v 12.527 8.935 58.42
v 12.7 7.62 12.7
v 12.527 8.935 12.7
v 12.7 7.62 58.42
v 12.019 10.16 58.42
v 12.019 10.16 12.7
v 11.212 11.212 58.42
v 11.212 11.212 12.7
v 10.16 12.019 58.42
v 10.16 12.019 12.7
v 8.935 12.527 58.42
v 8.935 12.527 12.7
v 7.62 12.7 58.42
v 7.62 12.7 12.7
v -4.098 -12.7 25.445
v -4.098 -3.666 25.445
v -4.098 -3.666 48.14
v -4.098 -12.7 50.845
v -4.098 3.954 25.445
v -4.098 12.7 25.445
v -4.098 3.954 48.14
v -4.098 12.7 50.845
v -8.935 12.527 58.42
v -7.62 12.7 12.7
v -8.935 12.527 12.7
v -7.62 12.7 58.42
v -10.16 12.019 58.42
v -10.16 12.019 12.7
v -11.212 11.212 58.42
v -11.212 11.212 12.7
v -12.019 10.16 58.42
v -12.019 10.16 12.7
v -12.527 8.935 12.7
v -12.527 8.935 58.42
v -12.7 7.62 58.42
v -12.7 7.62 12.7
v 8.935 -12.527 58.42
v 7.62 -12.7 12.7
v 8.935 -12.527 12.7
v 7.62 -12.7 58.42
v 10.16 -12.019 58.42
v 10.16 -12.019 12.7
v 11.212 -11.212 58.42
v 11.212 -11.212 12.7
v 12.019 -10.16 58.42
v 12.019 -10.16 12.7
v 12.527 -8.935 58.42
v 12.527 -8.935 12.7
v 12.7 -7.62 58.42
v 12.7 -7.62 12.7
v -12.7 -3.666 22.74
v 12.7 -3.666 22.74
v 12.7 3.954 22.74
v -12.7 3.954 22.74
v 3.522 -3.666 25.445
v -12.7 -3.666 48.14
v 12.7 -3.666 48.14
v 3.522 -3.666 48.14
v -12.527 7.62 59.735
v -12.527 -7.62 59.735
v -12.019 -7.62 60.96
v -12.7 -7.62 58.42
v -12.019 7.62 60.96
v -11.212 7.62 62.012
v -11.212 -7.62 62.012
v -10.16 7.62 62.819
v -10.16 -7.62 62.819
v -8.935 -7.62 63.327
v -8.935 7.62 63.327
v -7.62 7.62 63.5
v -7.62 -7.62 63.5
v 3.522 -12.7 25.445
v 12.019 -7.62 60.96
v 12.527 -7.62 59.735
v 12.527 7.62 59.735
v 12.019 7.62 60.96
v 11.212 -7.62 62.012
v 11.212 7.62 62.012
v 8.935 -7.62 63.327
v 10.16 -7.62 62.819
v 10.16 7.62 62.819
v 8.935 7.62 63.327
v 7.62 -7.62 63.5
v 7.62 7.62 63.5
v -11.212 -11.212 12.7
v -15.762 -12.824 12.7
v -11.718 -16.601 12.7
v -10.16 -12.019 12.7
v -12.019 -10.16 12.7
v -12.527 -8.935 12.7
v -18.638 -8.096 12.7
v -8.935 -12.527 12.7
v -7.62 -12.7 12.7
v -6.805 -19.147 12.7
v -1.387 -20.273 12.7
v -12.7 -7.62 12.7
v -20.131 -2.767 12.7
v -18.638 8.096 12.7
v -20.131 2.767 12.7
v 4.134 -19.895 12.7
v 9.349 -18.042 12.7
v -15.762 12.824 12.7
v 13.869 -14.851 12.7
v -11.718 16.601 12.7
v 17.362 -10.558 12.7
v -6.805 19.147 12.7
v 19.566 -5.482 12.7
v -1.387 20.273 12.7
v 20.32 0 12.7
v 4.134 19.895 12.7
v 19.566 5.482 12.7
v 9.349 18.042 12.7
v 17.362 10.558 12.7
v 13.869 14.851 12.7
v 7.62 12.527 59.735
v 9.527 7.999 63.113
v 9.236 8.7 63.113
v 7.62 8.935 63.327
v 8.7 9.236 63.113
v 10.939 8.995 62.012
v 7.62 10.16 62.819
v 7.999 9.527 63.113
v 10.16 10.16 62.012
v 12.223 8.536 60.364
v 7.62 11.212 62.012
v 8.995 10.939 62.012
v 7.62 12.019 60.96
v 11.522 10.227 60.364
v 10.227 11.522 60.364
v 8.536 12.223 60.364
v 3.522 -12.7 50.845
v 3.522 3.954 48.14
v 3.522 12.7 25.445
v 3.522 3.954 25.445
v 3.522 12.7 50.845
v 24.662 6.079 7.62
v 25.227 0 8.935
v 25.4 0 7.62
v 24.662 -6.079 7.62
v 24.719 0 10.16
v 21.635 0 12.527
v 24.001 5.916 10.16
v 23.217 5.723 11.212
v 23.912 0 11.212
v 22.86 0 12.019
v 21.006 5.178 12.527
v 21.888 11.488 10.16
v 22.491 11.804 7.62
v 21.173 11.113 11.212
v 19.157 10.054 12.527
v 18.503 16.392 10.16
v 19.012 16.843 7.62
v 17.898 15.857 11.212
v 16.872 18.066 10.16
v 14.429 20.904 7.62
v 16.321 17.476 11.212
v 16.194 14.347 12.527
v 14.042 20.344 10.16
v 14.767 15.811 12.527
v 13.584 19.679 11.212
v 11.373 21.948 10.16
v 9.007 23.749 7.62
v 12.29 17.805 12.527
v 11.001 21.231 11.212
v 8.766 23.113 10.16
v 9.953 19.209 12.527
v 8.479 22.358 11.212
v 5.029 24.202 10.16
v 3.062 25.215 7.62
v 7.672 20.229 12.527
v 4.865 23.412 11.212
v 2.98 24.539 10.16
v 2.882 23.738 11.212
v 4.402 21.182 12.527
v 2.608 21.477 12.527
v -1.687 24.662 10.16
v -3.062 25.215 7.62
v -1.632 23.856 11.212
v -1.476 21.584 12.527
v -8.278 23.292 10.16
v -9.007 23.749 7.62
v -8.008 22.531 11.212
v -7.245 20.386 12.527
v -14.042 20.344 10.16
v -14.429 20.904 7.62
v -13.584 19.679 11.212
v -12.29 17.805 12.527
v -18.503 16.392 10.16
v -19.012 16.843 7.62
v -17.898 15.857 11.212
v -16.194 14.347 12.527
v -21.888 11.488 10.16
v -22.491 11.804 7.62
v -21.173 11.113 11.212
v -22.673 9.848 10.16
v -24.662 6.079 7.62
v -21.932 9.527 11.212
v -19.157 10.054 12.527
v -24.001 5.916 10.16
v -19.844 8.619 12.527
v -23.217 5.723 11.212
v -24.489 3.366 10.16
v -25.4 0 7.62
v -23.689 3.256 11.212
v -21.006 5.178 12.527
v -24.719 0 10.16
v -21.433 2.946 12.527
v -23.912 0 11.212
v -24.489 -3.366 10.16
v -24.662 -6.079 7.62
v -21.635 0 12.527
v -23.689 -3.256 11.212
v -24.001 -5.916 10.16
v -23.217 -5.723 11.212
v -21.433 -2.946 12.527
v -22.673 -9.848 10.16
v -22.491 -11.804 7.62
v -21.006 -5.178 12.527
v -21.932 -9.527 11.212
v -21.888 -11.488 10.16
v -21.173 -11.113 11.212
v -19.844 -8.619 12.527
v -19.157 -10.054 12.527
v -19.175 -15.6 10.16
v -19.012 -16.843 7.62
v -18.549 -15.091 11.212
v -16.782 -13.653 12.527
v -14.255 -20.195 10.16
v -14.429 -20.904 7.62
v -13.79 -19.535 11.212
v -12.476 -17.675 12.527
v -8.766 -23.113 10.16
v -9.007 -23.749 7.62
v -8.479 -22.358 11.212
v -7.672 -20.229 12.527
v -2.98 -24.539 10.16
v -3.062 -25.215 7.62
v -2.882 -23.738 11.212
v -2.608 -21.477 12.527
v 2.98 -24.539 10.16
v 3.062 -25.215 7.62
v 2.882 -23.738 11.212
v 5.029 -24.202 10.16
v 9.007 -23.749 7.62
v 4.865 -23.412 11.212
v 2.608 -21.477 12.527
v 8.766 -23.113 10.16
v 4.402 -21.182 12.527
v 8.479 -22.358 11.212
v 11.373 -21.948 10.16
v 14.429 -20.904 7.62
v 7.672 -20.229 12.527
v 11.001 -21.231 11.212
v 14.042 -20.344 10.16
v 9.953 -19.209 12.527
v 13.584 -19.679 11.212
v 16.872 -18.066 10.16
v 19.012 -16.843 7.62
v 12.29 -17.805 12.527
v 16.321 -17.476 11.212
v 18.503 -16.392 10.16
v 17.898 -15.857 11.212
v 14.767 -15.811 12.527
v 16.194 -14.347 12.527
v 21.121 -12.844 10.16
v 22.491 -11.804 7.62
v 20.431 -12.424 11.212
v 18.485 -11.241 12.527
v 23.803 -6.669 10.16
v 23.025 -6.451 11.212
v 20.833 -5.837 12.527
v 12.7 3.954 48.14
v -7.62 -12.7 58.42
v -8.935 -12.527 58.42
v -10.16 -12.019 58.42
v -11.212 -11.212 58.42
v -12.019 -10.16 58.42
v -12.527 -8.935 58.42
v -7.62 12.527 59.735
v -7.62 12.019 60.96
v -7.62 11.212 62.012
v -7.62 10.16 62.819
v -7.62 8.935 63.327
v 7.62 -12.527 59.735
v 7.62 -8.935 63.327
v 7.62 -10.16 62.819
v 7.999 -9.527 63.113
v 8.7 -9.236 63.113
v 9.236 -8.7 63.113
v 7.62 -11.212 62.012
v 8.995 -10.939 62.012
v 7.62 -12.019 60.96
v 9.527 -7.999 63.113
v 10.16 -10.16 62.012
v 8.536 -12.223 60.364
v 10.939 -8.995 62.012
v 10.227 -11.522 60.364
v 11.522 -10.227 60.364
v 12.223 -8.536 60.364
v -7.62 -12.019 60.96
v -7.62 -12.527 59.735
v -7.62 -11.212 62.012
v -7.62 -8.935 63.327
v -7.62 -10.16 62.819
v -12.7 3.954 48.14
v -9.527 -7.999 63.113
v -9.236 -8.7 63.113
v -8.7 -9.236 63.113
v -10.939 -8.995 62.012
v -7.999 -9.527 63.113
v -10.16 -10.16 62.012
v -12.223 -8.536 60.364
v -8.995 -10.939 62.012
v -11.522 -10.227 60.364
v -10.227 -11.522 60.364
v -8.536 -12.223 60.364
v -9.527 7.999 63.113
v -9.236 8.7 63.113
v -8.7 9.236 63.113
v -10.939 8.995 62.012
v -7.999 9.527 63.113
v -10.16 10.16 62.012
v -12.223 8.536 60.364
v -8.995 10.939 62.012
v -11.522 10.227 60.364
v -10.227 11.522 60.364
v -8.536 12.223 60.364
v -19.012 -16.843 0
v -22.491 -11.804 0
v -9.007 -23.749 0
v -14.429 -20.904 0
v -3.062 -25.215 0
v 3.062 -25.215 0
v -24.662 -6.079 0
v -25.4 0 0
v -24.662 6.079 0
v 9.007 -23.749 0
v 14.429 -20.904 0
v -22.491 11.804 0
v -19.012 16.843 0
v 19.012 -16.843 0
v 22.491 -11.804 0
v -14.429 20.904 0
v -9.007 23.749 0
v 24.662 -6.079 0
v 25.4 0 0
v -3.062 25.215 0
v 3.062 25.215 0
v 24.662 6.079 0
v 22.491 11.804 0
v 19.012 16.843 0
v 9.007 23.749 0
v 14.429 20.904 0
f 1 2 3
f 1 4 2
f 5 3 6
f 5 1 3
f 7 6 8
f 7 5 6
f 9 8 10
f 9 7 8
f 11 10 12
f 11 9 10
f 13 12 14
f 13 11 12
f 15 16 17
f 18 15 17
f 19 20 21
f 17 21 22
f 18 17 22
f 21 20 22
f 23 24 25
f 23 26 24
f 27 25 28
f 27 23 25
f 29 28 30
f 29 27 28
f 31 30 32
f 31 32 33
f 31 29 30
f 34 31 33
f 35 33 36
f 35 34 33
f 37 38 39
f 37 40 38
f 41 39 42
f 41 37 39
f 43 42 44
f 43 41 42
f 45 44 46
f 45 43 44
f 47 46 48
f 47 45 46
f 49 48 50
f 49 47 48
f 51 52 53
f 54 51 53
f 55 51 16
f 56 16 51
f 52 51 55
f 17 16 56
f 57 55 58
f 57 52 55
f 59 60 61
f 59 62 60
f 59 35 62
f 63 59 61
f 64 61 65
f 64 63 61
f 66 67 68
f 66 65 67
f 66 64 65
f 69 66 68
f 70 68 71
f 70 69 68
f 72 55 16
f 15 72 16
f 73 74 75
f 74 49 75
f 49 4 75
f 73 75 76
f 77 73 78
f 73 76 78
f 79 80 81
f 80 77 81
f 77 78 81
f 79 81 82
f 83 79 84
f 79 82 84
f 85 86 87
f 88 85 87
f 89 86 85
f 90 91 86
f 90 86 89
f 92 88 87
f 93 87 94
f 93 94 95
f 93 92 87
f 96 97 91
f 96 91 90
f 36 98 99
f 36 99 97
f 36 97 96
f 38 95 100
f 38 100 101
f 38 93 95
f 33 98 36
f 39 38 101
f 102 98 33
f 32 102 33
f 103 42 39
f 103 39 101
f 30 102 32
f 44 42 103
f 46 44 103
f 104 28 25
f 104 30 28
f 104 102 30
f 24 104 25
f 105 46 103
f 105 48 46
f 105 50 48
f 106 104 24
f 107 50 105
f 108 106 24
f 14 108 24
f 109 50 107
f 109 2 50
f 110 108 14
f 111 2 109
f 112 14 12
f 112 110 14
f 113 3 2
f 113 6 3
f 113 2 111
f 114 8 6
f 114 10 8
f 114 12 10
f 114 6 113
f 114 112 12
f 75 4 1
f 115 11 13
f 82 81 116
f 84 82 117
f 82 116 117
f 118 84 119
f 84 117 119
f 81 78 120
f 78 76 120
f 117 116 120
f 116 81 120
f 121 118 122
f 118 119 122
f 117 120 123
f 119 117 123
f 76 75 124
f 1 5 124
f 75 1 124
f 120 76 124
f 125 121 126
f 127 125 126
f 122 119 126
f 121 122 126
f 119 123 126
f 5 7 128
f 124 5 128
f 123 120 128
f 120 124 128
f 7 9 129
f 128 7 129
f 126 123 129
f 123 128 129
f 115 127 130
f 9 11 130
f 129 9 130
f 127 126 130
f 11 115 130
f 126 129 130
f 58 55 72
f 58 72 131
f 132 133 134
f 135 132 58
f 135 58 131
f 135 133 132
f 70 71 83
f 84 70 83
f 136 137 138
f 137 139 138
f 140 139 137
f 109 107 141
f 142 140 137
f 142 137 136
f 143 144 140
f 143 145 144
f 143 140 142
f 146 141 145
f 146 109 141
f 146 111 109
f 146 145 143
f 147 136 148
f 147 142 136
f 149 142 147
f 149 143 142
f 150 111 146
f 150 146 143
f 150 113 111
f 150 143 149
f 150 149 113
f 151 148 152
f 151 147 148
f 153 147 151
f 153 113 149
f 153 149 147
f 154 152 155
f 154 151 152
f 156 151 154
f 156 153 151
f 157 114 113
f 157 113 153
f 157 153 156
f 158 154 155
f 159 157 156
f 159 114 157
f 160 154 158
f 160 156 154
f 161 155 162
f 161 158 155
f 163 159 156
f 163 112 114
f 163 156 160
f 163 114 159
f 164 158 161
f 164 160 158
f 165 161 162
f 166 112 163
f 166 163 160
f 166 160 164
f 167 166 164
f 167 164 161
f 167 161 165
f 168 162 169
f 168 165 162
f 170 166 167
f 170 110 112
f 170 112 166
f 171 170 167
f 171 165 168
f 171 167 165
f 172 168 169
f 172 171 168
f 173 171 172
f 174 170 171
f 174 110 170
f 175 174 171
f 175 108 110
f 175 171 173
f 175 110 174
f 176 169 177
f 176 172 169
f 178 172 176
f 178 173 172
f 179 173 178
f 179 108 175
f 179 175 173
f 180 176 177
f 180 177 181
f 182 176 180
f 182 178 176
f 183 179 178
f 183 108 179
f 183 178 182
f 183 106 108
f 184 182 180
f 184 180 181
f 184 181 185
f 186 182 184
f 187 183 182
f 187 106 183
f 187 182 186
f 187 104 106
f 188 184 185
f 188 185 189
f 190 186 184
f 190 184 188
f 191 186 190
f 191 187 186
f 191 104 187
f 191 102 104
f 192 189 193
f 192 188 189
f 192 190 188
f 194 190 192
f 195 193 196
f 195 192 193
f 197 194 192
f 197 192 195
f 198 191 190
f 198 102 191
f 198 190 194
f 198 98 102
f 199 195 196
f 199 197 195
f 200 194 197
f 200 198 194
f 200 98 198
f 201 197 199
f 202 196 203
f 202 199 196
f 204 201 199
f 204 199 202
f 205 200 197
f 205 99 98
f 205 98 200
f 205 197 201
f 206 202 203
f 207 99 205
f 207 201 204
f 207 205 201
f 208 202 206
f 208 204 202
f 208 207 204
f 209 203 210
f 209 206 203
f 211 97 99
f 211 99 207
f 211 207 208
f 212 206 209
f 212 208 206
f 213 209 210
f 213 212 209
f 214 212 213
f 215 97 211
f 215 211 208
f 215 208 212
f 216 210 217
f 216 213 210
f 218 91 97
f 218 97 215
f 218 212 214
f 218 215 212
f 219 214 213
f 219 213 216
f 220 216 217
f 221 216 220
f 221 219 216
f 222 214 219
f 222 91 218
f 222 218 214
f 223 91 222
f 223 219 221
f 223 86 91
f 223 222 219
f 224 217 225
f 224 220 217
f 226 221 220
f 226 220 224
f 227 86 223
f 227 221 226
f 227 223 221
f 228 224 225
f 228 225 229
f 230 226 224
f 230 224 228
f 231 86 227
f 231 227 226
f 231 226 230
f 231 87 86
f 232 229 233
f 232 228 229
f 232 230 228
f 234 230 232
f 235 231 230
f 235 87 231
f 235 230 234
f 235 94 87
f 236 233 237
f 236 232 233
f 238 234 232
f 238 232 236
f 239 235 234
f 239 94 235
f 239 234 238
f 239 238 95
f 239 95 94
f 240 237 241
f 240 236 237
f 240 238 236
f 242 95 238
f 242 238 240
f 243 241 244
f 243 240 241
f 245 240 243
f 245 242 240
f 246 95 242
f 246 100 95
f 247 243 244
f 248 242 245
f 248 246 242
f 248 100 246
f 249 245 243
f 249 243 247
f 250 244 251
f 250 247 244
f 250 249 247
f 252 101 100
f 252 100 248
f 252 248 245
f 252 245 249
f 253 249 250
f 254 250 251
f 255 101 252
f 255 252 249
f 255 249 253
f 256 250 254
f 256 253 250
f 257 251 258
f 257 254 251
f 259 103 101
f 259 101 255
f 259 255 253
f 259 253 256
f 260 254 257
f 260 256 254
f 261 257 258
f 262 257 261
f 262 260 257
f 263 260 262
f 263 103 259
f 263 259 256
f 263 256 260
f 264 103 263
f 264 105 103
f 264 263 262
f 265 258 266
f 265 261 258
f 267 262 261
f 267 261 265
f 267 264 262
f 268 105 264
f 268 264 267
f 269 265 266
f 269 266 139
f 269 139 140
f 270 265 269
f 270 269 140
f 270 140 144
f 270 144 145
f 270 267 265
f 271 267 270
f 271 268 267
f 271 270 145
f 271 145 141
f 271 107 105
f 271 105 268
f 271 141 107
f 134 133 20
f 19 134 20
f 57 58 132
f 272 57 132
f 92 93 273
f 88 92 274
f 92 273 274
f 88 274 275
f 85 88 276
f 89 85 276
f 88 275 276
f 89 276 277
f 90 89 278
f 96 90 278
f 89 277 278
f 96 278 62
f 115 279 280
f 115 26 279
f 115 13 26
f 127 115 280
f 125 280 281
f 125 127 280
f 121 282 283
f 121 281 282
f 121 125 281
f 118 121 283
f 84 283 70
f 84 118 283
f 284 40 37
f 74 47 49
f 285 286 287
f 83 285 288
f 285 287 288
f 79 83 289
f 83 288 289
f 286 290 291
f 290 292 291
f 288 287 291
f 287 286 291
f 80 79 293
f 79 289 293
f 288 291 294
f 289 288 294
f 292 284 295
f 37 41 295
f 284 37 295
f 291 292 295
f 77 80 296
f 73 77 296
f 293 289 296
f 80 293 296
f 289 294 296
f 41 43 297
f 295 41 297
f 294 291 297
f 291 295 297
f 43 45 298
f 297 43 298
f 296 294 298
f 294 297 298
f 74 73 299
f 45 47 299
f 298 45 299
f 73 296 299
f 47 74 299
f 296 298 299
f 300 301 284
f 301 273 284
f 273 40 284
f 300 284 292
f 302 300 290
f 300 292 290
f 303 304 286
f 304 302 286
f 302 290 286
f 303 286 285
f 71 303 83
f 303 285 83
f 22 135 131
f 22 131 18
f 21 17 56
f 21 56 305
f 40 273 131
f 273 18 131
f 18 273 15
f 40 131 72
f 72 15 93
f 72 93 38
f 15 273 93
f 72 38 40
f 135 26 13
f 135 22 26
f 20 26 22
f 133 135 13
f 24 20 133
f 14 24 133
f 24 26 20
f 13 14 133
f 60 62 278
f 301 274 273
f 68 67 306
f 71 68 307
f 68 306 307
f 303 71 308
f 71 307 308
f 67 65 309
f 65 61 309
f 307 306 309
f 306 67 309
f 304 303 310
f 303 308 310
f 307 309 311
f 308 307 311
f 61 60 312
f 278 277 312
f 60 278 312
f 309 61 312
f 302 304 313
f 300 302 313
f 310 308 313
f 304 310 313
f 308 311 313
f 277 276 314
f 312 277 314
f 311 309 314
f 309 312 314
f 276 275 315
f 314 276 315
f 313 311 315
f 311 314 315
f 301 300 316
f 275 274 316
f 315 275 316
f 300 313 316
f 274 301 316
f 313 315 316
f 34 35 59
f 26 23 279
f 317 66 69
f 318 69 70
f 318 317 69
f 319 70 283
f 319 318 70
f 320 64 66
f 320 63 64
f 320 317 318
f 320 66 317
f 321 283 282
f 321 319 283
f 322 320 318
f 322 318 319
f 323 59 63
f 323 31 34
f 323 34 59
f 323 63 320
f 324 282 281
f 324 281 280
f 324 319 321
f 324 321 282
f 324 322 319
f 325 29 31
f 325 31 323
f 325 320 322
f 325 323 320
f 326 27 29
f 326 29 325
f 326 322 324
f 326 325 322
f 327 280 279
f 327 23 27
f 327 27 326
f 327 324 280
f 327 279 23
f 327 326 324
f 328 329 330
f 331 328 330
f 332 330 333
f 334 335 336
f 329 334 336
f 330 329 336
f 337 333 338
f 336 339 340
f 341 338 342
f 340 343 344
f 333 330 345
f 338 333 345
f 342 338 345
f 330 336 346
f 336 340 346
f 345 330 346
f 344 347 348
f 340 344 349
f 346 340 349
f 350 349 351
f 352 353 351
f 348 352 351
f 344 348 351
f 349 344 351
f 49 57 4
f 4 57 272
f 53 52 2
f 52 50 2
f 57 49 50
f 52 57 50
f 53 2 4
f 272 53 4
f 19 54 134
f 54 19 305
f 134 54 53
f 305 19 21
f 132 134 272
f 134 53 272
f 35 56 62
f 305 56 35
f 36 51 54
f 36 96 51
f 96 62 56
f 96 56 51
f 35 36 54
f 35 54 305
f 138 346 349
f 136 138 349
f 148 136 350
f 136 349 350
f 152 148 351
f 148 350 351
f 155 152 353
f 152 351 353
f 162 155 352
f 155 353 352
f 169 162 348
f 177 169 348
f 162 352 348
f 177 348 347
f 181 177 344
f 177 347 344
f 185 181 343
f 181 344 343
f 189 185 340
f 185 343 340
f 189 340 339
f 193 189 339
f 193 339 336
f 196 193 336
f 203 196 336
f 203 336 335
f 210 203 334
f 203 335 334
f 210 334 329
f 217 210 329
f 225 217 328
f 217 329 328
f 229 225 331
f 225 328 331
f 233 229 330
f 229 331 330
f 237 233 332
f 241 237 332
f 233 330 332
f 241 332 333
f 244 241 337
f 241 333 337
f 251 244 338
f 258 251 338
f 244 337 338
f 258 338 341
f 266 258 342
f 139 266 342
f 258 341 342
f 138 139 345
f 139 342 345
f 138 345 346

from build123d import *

# Parameters (mm, degrees)
F0_R     = 25.4
F1_DEPTH = 12.7
F2_W     = 25.4
F2_H     = 25.4
F3_DEPTH = 50.8
F4_R     = 5.08
F5_W     = 7.62
F5_H     = 25.4
F6_DEPTH = 25.4
F7_W     = 7.62
F7_H     = 25.4
F8_DEPTH = 25.4


with BuildPart() as f1:
    # F0 (on Top) → F1 (new body)
    with BuildSketch(Plane.XY):
        Circle(F0_R)
    extrude(amount=F1_DEPTH)

    # F2 (on face) → F3 (join)
    with BuildSketch(Plane.XY.offset(12.7)):
        Rectangle(F2_W, F2_H)
    extrude(amount=F3_DEPTH)

    # F4
    f4_edges = [f1.edges().sort_by_distance(p)[0] for p in [
        (12.7, -12.7, 38.1),
        (-12.7, -12.7, 38.1),
        (12.7, 12.7, 38.1),
        (-12.7, 12.7, 38.1),
        (-25.4, 0, 12.7),
        (-12.7, 0, 63.5),
        (0, -12.7, 63.5),
        (12.7, 0, 63.5),
        (0, 12.7, 63.5),
    ]]
    fillet(f4_edges, radius=F4_R)

    # F5 (on face) → F6 (cut)
    with BuildSketch(Plane.YZ.offset(12.7)):
        with Locations((0.143903, 35.440086)):
            Rectangle(F5_W, F5_H)
    extrude(amount=-F6_DEPTH, mode=Mode.SUBTRACT)

    # F7 (on face) → F8 (cut)
    with BuildSketch(Plane(origin=(0, 12.7, 0), x_dir=(-1, 0, 0), z_dir=(0, 1, 0))):
        with Locations((0.287806, 38.145431)):
            Rectangle(F7_W, F7_H)
    extrude(amount=-F8_DEPTH, mode=Mode.SUBTRACT)


solid = f1.part
